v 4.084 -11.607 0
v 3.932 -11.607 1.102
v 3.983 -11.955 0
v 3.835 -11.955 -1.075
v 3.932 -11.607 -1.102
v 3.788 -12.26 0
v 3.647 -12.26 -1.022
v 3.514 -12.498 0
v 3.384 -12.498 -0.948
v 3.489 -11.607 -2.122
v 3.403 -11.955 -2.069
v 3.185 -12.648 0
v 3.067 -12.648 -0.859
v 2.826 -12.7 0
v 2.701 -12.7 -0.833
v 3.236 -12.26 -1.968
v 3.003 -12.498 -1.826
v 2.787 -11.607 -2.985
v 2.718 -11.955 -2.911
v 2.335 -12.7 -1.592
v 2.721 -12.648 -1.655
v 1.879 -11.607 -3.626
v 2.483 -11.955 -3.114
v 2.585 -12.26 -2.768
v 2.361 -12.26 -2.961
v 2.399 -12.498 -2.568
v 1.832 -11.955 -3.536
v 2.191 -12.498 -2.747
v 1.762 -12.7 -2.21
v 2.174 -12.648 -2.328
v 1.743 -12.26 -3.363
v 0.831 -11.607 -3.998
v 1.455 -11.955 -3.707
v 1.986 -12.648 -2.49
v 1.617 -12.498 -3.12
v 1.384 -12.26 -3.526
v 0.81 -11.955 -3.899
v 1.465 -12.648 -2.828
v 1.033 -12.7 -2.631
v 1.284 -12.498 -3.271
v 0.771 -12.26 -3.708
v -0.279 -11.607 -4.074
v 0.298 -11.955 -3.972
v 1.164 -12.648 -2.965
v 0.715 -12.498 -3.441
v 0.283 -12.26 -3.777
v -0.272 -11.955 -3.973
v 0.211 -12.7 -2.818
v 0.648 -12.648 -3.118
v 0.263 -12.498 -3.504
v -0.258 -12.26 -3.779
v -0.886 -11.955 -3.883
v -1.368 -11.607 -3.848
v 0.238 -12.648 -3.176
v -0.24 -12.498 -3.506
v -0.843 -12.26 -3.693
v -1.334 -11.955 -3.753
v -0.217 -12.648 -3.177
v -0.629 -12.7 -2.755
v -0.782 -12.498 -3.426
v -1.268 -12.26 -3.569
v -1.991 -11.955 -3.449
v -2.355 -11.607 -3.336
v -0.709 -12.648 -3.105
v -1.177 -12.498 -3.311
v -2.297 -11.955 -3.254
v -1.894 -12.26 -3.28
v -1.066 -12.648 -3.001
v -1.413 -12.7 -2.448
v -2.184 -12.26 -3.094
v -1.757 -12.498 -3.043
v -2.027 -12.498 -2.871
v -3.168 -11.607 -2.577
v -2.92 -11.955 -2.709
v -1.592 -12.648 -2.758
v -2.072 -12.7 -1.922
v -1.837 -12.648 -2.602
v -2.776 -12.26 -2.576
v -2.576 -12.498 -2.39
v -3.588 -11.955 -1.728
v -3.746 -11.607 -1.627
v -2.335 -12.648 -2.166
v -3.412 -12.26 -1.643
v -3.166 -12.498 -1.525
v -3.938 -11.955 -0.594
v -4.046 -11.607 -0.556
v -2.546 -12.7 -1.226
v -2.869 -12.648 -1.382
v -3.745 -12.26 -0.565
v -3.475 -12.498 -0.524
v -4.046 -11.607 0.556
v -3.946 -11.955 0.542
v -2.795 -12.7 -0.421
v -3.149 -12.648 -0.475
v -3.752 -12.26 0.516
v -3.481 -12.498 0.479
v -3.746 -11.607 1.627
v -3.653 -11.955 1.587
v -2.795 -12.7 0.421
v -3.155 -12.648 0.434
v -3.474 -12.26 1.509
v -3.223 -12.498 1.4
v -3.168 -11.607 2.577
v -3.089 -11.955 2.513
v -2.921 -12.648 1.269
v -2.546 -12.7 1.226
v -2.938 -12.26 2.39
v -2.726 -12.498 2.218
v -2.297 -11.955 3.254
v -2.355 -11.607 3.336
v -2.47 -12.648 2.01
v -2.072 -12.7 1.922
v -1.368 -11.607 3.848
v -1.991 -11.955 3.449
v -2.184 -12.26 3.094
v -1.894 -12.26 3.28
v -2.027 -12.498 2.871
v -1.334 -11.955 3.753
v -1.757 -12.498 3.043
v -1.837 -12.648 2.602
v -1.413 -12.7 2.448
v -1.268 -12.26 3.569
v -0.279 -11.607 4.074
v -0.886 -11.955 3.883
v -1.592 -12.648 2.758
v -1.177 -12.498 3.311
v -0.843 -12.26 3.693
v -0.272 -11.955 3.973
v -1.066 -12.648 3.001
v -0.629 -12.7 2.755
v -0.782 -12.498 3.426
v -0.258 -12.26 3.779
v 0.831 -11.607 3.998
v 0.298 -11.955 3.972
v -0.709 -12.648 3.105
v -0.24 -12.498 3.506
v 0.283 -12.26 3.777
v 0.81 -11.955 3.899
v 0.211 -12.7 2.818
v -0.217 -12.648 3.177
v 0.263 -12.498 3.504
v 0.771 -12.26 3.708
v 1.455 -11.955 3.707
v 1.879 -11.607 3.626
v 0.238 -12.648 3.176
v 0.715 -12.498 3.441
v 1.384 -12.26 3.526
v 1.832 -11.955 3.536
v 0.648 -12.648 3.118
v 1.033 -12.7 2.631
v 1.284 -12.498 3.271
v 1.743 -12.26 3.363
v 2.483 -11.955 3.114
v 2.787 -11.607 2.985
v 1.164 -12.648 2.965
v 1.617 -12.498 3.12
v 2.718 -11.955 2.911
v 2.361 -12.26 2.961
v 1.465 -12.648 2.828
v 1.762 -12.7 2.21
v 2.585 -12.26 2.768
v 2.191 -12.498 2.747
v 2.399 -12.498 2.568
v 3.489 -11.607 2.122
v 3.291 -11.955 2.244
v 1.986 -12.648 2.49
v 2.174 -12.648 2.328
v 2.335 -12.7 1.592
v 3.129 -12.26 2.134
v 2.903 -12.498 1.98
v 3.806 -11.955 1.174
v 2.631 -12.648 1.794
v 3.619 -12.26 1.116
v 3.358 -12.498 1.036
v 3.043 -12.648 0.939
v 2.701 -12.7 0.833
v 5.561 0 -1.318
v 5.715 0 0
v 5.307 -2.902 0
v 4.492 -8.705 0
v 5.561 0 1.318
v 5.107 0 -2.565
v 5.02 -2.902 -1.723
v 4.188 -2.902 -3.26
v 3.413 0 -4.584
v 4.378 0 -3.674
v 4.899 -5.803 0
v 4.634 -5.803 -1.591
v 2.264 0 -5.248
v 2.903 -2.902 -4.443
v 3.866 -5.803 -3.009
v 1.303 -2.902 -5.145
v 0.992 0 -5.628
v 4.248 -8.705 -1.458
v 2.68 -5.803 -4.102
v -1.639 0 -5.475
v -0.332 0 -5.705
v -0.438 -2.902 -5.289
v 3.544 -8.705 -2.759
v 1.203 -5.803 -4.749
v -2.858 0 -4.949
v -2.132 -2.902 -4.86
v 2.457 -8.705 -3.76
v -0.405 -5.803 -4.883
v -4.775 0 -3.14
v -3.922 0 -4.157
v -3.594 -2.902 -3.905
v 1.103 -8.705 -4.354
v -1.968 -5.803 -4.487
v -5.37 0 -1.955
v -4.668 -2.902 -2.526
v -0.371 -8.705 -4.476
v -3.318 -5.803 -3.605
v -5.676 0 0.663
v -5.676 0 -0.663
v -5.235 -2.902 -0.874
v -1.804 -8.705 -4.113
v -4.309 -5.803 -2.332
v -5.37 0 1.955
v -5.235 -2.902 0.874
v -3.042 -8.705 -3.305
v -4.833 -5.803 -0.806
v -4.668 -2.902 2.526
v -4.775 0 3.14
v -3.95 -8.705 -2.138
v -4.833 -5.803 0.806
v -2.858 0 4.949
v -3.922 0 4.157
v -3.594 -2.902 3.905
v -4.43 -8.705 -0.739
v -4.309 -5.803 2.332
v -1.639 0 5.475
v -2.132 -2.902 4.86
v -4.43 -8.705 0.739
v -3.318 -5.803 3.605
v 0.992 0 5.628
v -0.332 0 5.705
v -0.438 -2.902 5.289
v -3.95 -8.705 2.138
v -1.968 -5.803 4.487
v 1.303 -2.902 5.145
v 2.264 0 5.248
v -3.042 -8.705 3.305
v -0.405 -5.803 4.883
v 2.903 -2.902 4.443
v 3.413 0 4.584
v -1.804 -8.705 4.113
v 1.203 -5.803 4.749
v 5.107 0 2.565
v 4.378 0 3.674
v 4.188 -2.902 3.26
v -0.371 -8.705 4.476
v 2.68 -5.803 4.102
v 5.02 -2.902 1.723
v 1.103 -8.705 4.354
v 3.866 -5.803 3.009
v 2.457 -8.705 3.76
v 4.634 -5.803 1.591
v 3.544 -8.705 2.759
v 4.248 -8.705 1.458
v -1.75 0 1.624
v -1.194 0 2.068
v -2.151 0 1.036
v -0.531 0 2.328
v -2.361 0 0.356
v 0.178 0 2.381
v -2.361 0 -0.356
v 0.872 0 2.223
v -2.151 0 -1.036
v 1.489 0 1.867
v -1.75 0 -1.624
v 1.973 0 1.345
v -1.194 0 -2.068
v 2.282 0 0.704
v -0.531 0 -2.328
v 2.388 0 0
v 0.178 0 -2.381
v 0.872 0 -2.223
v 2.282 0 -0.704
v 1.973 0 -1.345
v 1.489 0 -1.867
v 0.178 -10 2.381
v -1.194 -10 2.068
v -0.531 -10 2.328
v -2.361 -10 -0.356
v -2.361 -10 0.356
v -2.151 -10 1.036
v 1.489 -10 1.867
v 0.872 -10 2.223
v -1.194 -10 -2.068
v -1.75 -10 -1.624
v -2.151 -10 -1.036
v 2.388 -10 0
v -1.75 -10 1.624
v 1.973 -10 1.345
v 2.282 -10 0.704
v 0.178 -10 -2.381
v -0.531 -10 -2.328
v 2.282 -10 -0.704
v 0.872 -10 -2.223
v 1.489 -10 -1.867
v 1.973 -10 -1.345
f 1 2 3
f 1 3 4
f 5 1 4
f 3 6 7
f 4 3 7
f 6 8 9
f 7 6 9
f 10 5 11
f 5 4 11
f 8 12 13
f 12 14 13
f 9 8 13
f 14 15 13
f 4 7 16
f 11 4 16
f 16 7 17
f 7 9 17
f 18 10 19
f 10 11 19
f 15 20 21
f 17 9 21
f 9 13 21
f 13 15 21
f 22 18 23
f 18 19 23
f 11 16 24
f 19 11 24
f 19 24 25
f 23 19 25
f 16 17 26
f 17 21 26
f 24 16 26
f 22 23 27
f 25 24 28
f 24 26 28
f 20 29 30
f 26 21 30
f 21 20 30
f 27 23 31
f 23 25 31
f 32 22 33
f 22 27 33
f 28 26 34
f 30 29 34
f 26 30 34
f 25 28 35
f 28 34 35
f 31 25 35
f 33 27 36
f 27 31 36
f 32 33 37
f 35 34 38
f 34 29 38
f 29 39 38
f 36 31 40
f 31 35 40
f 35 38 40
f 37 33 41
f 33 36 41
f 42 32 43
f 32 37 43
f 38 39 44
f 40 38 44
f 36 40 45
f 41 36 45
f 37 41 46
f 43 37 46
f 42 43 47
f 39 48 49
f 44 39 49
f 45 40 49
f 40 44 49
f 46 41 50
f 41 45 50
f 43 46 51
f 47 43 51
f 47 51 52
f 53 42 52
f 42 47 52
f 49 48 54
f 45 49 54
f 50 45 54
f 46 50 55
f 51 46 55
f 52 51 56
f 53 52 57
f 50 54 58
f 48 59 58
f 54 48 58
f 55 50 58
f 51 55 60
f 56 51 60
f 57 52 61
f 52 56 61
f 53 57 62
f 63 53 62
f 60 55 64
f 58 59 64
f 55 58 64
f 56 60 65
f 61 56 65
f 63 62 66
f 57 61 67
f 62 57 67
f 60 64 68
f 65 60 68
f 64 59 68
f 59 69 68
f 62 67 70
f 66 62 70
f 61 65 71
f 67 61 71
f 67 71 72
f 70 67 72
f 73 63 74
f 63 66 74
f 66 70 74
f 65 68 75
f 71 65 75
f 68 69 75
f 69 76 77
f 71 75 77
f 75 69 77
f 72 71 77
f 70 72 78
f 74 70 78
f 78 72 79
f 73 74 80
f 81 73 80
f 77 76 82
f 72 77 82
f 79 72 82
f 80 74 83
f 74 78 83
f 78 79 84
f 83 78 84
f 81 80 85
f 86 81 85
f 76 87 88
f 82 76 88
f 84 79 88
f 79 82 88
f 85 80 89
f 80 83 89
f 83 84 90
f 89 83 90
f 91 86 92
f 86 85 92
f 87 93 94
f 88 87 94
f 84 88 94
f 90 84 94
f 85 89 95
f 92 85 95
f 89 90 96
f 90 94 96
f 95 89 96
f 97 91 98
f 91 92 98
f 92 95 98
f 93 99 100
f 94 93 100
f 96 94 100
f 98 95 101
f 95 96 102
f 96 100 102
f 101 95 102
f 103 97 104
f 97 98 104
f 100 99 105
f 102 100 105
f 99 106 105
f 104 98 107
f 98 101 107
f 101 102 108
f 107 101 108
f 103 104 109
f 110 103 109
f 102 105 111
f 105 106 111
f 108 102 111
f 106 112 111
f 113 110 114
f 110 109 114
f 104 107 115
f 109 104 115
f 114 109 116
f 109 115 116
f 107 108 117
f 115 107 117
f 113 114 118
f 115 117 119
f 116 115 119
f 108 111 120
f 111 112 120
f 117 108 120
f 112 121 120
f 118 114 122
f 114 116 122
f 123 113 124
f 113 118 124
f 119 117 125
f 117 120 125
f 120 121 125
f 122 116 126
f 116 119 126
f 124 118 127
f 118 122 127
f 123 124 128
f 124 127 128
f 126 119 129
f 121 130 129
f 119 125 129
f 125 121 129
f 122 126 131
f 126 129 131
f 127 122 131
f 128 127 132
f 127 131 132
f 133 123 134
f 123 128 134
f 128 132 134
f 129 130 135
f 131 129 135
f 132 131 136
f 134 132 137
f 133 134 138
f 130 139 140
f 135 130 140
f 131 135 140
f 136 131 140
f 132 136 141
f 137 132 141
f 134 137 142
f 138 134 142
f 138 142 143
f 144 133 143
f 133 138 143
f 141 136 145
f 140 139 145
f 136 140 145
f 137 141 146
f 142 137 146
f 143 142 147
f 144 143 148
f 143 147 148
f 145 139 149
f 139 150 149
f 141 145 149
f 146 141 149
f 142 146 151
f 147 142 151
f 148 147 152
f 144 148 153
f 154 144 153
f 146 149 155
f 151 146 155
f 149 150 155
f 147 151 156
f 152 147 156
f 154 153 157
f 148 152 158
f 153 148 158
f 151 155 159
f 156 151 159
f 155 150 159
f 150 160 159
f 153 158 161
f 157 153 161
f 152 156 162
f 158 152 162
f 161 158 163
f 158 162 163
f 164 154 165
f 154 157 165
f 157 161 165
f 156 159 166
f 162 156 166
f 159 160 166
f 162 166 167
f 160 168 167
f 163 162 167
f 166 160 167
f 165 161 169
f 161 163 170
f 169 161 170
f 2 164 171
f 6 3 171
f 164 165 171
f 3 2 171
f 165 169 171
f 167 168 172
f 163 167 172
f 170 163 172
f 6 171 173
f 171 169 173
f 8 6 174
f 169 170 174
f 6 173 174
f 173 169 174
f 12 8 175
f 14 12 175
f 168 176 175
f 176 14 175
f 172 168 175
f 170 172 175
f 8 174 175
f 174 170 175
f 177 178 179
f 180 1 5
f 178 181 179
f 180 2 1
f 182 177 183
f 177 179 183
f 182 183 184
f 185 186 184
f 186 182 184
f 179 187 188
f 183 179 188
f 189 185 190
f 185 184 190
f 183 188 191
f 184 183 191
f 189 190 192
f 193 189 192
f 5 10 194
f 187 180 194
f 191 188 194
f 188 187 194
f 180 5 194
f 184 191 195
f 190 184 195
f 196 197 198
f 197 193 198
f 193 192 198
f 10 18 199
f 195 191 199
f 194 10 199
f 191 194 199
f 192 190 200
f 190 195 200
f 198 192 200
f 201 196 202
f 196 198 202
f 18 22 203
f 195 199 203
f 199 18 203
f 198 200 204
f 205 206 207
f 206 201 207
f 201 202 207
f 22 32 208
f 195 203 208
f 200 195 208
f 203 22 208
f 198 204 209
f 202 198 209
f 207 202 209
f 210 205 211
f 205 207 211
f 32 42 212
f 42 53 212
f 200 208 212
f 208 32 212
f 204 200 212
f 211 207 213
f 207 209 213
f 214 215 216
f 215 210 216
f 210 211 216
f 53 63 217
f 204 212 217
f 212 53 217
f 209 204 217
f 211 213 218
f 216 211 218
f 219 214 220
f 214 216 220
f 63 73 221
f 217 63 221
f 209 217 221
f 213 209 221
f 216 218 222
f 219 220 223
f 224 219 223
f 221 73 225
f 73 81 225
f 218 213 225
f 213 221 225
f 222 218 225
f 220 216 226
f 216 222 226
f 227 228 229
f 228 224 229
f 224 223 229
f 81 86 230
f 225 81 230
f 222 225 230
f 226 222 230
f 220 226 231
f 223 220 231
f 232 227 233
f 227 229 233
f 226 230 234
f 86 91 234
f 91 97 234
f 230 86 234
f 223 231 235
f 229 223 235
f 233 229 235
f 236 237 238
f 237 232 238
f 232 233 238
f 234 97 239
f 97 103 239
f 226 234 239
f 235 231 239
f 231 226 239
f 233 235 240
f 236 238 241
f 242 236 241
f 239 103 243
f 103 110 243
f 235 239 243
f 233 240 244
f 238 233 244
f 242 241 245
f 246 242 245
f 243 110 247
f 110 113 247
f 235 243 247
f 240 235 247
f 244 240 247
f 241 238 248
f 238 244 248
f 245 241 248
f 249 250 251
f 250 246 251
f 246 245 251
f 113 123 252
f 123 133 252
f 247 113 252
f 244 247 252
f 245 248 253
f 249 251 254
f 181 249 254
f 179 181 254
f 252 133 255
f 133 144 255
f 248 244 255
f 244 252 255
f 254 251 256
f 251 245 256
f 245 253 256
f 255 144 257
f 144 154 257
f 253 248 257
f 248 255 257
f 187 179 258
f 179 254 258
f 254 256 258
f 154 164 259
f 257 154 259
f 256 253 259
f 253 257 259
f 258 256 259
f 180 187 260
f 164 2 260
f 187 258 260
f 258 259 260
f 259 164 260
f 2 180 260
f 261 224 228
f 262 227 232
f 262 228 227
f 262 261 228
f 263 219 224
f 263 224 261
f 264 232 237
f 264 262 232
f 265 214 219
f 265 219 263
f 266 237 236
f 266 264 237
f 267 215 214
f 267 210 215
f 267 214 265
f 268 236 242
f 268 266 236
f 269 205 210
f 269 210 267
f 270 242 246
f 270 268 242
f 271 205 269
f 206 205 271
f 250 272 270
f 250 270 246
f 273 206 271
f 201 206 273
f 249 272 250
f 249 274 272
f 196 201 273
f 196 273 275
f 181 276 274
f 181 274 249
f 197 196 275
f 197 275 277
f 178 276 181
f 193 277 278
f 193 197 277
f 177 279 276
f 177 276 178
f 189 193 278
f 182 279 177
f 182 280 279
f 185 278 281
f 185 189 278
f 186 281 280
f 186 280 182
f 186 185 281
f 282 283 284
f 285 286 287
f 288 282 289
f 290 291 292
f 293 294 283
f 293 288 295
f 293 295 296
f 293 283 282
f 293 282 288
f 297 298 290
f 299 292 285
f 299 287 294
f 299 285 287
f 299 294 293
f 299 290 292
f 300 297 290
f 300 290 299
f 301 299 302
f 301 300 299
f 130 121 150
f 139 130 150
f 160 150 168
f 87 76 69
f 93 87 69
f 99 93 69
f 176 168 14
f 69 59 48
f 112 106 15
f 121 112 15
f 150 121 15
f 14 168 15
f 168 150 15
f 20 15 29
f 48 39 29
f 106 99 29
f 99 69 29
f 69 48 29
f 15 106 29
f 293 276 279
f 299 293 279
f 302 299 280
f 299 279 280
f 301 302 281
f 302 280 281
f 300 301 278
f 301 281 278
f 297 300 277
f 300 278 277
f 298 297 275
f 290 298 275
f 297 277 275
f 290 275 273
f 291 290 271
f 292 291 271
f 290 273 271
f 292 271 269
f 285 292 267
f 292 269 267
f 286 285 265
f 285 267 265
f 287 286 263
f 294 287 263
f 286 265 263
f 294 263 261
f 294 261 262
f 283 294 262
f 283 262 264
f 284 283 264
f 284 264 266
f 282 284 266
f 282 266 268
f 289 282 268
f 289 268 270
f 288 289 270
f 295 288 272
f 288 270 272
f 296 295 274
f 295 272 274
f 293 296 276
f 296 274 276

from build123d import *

# Parameters (mm, degrees)
SKETCH1_R           = 5.715
BOSS_EXTRUDE1_DEPTH = 12.7
BOSS_EXTRUDE1_TAPER = 8
SKETCH2_R           = 2.3876
CUT_EXTRUDE1_DEPTH  = 10
FILLET1_R           = 1.27


with BuildPart() as part:
    # Sketch1 → Boss-Extrude1 (new body)
    with BuildSketch(Plane(origin=(0, 0, 0), x_dir=(1, 0, 0), z_dir=(0, 1, 0))):
        Circle(SKETCH1_R)
    extrude(amount=-BOSS_EXTRUDE1_DEPTH, taper=BOSS_EXTRUDE1_TAPER)

    # Sketch2 → Cut-Extrude1 (cut)
    with BuildSketch(Plane(origin=(0, 0, 0), x_dir=(1, 0, 0), z_dir=(0, 1, 0))):
        Circle(SKETCH2_R)
    extrude(amount=-CUT_EXTRUDE1_DEPTH, mode=Mode.SUBTRACT)

    # Fillet1
    fillet1_edges = [part.edges().sort_by_distance(p)[0] for p in [
        (-3.930131399, -12.7, 0),
    ]]
    fillet(fillet1_edges, radius=FILLET1_R)


solid = part.part
